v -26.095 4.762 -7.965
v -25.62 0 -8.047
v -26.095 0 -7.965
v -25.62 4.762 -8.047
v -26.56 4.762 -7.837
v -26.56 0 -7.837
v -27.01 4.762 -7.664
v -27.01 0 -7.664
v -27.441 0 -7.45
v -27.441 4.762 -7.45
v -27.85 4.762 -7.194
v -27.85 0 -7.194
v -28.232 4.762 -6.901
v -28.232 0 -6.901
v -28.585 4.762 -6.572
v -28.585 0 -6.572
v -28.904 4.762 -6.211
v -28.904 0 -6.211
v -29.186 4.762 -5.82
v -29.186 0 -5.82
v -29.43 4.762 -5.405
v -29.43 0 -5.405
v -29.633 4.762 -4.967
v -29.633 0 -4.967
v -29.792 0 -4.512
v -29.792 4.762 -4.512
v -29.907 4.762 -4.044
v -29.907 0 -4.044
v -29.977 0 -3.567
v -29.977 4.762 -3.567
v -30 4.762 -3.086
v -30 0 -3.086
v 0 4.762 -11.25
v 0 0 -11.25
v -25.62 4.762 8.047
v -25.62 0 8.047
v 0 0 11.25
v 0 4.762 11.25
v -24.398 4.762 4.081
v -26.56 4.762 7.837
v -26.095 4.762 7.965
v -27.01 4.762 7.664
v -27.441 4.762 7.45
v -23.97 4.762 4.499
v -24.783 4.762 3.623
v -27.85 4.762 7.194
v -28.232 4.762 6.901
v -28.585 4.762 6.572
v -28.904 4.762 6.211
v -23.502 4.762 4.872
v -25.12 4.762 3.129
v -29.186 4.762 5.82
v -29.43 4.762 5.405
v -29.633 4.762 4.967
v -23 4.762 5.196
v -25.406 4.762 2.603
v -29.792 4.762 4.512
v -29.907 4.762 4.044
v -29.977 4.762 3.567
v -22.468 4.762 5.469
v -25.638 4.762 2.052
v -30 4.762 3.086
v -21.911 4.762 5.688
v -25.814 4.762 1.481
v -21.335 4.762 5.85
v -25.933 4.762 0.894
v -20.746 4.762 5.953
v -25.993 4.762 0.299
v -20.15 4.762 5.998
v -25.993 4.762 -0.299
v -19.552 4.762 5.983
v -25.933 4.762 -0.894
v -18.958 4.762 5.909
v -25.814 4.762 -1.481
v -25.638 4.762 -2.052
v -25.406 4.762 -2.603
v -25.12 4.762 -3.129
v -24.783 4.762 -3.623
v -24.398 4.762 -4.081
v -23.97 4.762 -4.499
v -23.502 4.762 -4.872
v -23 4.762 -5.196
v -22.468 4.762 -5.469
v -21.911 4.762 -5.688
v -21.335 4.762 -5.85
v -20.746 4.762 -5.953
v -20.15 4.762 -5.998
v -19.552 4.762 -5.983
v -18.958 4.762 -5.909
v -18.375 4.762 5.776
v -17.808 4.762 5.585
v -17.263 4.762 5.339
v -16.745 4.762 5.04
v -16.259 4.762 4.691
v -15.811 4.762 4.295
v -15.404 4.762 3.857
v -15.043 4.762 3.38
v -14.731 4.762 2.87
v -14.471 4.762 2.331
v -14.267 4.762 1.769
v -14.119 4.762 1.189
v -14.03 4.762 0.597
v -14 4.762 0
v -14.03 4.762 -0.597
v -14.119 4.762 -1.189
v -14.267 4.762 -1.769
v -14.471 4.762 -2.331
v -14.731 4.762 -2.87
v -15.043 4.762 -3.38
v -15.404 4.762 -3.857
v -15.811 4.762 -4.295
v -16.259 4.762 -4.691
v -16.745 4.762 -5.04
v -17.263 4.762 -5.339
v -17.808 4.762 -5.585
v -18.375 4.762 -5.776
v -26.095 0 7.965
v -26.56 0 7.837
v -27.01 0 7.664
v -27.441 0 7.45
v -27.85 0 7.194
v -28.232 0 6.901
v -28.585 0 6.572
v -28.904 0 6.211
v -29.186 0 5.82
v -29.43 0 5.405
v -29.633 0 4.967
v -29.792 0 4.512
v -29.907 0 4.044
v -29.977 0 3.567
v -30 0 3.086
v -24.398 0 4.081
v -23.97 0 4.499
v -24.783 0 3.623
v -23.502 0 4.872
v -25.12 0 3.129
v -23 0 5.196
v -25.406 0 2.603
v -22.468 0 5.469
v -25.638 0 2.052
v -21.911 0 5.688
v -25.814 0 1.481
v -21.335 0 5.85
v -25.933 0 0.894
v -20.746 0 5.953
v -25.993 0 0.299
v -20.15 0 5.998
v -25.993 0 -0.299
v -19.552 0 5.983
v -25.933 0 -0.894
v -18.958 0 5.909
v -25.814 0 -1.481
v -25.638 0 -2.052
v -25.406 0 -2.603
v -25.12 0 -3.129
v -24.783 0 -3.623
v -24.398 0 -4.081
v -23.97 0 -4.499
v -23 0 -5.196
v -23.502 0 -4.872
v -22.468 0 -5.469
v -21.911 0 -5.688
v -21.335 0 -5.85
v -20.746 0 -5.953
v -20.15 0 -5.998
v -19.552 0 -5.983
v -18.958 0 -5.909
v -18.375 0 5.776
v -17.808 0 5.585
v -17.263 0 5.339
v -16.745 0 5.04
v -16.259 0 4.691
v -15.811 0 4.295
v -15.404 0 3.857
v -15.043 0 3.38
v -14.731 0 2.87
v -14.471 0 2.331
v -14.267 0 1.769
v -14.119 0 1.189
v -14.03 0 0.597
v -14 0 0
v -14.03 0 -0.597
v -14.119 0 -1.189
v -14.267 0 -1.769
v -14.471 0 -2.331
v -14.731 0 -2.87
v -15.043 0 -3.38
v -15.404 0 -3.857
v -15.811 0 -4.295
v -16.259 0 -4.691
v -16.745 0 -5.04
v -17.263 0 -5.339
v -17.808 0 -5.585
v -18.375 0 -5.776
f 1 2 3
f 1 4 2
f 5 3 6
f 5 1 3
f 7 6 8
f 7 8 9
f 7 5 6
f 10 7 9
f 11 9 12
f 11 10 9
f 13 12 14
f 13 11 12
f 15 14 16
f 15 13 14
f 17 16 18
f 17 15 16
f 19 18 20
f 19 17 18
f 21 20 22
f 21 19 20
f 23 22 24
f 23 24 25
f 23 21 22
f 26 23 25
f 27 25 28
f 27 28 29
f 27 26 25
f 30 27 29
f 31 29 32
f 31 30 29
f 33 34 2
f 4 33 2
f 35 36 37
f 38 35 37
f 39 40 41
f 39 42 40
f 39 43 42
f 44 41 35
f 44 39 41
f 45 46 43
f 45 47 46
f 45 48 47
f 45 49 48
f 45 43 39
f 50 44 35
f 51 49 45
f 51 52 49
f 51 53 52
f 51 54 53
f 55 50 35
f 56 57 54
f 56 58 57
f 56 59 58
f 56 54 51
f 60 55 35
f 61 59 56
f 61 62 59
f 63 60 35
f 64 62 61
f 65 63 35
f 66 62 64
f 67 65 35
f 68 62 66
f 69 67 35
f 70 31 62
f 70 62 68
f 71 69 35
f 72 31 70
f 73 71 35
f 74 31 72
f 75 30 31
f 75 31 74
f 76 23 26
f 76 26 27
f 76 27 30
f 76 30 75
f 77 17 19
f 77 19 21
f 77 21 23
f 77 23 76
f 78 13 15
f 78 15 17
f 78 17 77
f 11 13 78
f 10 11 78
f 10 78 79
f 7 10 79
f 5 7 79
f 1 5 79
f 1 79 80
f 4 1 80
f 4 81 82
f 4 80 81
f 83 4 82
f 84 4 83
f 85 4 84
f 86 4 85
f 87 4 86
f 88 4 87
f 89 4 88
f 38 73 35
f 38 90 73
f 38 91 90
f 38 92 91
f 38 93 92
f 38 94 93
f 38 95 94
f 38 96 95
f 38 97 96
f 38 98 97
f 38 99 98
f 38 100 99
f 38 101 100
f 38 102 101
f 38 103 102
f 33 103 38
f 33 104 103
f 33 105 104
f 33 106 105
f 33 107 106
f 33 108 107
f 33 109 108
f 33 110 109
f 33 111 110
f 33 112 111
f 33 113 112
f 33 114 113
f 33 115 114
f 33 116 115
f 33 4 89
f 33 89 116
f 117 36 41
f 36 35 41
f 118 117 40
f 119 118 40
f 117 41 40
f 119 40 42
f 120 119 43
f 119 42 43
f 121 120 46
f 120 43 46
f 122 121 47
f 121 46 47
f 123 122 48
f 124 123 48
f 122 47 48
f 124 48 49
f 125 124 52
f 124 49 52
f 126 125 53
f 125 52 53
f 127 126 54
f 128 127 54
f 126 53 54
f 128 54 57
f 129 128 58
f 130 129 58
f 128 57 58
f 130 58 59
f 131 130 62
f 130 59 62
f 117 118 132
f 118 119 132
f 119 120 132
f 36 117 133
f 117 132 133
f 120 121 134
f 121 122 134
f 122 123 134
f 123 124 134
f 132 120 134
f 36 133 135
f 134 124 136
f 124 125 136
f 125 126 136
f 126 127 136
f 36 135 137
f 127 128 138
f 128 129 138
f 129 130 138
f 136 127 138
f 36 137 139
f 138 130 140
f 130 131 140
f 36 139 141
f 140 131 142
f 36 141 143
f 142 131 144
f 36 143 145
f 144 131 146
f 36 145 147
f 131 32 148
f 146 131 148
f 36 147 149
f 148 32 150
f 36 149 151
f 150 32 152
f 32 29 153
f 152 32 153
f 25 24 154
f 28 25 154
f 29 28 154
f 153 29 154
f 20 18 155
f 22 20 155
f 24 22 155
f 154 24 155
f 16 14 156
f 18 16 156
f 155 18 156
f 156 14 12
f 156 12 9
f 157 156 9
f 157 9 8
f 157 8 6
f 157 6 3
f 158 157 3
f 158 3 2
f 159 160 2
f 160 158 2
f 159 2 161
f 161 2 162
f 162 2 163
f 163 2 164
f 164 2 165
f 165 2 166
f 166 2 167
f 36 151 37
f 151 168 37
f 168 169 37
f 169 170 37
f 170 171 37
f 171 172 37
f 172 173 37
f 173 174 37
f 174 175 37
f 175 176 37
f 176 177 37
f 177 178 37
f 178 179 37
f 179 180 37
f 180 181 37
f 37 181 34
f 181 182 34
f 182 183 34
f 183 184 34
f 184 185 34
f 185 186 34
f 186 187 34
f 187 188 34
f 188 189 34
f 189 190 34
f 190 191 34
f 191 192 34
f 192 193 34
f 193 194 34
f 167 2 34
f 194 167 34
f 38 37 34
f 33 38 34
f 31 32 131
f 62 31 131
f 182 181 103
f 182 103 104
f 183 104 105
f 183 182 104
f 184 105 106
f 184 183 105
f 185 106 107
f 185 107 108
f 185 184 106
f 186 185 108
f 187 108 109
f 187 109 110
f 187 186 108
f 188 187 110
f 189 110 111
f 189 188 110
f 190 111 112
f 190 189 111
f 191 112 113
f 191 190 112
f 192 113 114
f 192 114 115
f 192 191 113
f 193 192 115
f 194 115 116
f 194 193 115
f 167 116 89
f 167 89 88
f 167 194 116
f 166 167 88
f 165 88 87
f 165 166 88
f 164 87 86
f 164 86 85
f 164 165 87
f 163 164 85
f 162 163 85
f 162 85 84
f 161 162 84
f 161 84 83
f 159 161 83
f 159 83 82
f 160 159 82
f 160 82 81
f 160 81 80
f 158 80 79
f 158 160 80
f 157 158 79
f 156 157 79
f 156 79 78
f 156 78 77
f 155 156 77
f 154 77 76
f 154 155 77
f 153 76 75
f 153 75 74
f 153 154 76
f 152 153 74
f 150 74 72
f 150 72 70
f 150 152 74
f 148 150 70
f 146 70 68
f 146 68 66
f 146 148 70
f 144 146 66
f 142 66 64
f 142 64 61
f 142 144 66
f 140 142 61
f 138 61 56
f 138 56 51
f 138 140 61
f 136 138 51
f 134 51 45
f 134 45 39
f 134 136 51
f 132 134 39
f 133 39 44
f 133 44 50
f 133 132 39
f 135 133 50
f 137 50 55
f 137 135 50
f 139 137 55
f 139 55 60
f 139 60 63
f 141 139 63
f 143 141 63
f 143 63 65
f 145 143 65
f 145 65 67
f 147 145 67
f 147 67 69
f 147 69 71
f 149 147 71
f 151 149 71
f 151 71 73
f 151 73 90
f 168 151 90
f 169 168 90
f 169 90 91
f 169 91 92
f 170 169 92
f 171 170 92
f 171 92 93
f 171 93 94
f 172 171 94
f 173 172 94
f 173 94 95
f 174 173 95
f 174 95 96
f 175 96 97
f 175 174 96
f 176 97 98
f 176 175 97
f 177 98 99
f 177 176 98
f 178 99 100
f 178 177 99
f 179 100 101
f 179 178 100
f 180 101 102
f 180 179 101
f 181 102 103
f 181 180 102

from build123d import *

# Parameters (mm, degrees)
SKETCH1_R           = 6
BOSS_EXTRUDE1_DEPTH = 4.7625
FILLET1_R           = 5


with BuildPart() as part:
    # Sketch1 → Boss-Extrude1 (new body)
    with BuildSketch(Plane(origin=(0, 0, 0), x_dir=(1, 0, 0), z_dir=(0, 1, 0))):
        Polygon((0, -11.25), (0, 11.25), (-30, 7.5), (-30, -7.5), align=None)
        with Locations((-20, 0)):
            Circle(SKETCH1_R, mode=Mode.SUBTRACT)
    extrude(amount=BOSS_EXTRUDE1_DEPTH)

    # Fillet1
    fillet1_edges = [part.edges().sort_by_distance(p)[0] for p in [
        (-30, 2.38125, 7.5),
        (-30, 2.38125, -7.5),
    ]]
    fillet(fillet1_edges, radius=FILLET1_R)


solid = part.part
